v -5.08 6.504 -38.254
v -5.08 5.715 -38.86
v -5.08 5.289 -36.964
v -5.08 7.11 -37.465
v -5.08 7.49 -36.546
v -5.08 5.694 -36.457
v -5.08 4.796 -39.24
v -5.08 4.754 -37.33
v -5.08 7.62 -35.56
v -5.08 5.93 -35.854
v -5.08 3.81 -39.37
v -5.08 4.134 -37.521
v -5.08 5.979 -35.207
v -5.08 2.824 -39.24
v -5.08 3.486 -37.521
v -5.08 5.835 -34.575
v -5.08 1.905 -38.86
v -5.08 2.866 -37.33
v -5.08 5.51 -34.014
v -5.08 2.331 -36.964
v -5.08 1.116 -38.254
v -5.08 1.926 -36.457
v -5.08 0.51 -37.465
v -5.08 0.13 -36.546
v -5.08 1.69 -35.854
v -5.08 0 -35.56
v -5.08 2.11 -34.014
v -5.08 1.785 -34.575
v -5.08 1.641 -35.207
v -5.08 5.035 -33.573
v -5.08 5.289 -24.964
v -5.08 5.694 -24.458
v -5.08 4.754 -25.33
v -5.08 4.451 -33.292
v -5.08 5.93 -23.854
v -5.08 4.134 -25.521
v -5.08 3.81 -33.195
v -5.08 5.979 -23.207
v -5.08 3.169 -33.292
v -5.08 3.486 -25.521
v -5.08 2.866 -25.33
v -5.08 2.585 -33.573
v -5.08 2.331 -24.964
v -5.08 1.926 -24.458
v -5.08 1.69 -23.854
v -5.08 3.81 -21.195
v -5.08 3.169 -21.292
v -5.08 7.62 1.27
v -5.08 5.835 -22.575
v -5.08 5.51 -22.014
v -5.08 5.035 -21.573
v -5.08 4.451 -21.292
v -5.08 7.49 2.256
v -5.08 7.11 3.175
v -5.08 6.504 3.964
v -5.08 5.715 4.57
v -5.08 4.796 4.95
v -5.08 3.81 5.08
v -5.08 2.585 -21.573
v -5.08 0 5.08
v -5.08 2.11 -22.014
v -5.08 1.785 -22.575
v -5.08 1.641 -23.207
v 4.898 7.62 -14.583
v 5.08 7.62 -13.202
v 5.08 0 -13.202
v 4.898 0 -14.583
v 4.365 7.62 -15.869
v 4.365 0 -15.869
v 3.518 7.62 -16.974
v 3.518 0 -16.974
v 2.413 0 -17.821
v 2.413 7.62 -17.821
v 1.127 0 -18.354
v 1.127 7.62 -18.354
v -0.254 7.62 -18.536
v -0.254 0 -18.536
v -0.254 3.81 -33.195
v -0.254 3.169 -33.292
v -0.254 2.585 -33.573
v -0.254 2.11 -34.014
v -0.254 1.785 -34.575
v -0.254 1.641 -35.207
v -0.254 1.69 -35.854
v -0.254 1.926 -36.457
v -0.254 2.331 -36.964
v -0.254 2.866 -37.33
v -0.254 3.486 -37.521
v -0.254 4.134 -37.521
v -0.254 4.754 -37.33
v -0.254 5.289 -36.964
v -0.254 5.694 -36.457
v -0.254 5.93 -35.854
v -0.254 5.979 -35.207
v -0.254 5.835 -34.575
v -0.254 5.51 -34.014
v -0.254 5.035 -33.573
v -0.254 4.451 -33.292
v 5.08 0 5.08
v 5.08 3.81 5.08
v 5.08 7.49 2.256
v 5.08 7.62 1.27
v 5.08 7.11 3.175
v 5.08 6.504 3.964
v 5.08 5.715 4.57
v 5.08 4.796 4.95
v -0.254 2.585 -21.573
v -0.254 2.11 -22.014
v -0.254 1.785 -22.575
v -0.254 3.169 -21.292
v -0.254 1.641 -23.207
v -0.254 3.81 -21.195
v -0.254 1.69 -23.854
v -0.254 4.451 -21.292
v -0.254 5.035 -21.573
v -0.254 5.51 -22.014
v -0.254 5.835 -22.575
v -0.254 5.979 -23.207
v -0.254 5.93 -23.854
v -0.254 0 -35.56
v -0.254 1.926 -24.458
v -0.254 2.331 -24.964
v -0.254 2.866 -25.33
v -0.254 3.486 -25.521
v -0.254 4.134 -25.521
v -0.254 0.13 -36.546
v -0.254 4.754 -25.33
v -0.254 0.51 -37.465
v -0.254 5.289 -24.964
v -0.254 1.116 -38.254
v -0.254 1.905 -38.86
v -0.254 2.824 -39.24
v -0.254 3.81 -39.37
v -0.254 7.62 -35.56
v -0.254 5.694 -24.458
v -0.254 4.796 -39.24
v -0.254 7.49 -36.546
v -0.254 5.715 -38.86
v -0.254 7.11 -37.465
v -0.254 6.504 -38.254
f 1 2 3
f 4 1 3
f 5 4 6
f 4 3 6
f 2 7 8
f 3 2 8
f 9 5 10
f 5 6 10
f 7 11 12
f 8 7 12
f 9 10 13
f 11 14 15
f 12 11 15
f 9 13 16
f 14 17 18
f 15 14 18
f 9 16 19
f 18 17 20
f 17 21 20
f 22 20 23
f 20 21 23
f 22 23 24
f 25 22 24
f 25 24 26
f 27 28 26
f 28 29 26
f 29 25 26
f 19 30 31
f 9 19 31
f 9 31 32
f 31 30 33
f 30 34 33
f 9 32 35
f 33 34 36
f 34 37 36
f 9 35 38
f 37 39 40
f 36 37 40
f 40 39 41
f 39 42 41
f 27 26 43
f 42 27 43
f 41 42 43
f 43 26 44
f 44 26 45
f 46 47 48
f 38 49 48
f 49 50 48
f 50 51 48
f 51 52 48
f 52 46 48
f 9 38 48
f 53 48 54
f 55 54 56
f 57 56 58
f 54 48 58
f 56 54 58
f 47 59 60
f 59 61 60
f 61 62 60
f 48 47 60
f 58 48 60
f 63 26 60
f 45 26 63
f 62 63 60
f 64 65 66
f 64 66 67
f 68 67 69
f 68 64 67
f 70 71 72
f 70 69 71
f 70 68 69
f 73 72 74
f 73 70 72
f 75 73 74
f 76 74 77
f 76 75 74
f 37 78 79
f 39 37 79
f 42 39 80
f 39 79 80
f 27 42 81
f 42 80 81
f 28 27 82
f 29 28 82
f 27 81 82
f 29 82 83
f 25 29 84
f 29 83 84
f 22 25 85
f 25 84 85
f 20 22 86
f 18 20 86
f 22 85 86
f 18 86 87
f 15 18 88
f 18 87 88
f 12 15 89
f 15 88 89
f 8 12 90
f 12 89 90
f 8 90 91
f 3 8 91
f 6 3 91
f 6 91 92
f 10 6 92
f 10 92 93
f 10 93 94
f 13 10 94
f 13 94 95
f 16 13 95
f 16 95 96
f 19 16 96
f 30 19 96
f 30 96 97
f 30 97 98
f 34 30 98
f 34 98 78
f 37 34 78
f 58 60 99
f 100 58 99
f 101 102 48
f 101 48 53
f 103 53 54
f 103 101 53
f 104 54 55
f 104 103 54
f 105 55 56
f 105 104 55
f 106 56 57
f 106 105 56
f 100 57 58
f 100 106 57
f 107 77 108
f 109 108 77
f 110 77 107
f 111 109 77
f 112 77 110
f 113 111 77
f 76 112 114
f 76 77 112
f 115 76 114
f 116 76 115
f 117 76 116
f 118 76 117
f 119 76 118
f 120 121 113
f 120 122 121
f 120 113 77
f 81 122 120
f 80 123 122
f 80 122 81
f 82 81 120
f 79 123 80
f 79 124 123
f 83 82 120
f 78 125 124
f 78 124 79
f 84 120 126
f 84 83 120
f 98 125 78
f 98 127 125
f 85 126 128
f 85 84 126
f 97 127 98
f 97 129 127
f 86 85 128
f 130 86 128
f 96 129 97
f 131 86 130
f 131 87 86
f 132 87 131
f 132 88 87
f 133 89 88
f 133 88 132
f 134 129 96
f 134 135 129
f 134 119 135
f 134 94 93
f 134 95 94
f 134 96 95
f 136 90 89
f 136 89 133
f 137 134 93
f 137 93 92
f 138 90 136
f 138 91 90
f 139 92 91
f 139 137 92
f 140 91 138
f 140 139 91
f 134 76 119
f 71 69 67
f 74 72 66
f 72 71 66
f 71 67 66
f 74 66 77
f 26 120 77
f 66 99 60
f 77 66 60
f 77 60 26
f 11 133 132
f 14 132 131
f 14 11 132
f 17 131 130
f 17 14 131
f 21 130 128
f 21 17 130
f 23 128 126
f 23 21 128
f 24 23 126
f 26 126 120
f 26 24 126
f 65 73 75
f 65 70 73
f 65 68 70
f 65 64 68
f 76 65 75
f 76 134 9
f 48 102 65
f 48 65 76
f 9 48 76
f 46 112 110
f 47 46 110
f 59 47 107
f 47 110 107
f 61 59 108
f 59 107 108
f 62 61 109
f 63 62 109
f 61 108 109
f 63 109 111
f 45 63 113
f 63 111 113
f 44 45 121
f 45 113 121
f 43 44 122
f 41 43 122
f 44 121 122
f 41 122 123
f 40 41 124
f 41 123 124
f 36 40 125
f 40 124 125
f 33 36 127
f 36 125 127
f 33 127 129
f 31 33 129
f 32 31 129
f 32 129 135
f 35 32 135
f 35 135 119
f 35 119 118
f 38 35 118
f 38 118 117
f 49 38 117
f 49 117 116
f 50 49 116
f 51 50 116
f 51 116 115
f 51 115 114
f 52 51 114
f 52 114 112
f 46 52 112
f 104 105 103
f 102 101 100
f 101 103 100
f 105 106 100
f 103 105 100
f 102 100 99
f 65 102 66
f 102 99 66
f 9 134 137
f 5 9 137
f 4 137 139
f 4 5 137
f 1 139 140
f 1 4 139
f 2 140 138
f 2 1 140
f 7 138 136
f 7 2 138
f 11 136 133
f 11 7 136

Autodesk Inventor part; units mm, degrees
ref_plane "YZ Plane" through (0, 0, 0) normal (1, 0, 0) x (0, 1, 0)
ref_plane "XZ Plane" through (0, 0, 0) normal (0, 1, 0) x (-1, 0, 0)
ref_plane "XY Plane" through (0, 0, 0) normal (0, 0, 1) x (1, 0, 0)
sketch "Block1" plane through (0, 0, 0) normal (0, 0, 1) x (1, 0, 0)
  circle A0 centre (40.64, 3.81) radius 3.81
  point P0 (32.0567, 3.81)
sketch "Sketch1" plane through (0, 0, 0) normal (0, 1, 0) x (-1, 0, 0)
  line L0 (5.08, 5.08) -> (-5.08, 5.08)
  line L1 (-5.08, 5.08) -> (-5.08, -39.37)
  line L2 (-5.08, -39.37) -> (5.08, -39.37)
  line L3 (5.08, -39.37) -> (5.08, 5.08)
  point P0 (0, 0)
  dimension "d0" = 10.16
  dimension "d1" = 44.45
extrude "bar" add sketch "Sketch1" along normal blind 7.62
sketch "Sketch2" plane through (-5.08, 0, -39.37) normal (-1, 0, 0) x (0, 0, 1)
  circle A0 centre (4, 3.81) radius 2.175
  circle A1 centre (16, 3.81) radius 2.175
  circle A2 centre (9.9822, 3.81) radius 1.0704
  point P0 (39.37, 0)
  dimension "d4" = 4.35
  dimension "d5" = 4.35
hole "pegholes" at (-5.08, 3.81, -35.37) at (-5.08, 3.81, -23.37) direction (1, 0, 0) diameter 4.35 end through all
fillet "Fillet3" radius 3.81 3 edges at (0, 7.62, -39.37) (0, 0, -39.37) (0, 7.62, 5.08)
sketch "Sketch3" plane through (5.08, 0, 5.08) normal (1, 0, 0) x (0, 0, -1)
  line L0 (40.64, 7.62) -> (3.81, 7.62) projected
  line L1 (23.6161, 7.62) -> (40.64, 7.62)
  line L2 (40.64, 7.62) -> (40.64, 0)
  line L3 (40.64, 0) -> (23.6161, 0)
  line L4 (23.6161, 0) -> (23.6161, 7.62)
  circle A0 centre (40.64, 3.81) radius 3.81
  point P0 (5.08, 0)
extrude "Extrusion2" cut sketch "Sketch3" against normal blind 5.334 contours A0 L2 | L2 A0
extrude "Extrusion3" cut sketch "Sketch3" against normal blind 5.334 contours A0 L3 L4 L0 | L2 A0 picked at (39.3793, 3.6569)
fillet "Fillet4" radius 5.334 1 edges at (5.08, 3.81, -18.5361)
properties part number "fire-bar"
